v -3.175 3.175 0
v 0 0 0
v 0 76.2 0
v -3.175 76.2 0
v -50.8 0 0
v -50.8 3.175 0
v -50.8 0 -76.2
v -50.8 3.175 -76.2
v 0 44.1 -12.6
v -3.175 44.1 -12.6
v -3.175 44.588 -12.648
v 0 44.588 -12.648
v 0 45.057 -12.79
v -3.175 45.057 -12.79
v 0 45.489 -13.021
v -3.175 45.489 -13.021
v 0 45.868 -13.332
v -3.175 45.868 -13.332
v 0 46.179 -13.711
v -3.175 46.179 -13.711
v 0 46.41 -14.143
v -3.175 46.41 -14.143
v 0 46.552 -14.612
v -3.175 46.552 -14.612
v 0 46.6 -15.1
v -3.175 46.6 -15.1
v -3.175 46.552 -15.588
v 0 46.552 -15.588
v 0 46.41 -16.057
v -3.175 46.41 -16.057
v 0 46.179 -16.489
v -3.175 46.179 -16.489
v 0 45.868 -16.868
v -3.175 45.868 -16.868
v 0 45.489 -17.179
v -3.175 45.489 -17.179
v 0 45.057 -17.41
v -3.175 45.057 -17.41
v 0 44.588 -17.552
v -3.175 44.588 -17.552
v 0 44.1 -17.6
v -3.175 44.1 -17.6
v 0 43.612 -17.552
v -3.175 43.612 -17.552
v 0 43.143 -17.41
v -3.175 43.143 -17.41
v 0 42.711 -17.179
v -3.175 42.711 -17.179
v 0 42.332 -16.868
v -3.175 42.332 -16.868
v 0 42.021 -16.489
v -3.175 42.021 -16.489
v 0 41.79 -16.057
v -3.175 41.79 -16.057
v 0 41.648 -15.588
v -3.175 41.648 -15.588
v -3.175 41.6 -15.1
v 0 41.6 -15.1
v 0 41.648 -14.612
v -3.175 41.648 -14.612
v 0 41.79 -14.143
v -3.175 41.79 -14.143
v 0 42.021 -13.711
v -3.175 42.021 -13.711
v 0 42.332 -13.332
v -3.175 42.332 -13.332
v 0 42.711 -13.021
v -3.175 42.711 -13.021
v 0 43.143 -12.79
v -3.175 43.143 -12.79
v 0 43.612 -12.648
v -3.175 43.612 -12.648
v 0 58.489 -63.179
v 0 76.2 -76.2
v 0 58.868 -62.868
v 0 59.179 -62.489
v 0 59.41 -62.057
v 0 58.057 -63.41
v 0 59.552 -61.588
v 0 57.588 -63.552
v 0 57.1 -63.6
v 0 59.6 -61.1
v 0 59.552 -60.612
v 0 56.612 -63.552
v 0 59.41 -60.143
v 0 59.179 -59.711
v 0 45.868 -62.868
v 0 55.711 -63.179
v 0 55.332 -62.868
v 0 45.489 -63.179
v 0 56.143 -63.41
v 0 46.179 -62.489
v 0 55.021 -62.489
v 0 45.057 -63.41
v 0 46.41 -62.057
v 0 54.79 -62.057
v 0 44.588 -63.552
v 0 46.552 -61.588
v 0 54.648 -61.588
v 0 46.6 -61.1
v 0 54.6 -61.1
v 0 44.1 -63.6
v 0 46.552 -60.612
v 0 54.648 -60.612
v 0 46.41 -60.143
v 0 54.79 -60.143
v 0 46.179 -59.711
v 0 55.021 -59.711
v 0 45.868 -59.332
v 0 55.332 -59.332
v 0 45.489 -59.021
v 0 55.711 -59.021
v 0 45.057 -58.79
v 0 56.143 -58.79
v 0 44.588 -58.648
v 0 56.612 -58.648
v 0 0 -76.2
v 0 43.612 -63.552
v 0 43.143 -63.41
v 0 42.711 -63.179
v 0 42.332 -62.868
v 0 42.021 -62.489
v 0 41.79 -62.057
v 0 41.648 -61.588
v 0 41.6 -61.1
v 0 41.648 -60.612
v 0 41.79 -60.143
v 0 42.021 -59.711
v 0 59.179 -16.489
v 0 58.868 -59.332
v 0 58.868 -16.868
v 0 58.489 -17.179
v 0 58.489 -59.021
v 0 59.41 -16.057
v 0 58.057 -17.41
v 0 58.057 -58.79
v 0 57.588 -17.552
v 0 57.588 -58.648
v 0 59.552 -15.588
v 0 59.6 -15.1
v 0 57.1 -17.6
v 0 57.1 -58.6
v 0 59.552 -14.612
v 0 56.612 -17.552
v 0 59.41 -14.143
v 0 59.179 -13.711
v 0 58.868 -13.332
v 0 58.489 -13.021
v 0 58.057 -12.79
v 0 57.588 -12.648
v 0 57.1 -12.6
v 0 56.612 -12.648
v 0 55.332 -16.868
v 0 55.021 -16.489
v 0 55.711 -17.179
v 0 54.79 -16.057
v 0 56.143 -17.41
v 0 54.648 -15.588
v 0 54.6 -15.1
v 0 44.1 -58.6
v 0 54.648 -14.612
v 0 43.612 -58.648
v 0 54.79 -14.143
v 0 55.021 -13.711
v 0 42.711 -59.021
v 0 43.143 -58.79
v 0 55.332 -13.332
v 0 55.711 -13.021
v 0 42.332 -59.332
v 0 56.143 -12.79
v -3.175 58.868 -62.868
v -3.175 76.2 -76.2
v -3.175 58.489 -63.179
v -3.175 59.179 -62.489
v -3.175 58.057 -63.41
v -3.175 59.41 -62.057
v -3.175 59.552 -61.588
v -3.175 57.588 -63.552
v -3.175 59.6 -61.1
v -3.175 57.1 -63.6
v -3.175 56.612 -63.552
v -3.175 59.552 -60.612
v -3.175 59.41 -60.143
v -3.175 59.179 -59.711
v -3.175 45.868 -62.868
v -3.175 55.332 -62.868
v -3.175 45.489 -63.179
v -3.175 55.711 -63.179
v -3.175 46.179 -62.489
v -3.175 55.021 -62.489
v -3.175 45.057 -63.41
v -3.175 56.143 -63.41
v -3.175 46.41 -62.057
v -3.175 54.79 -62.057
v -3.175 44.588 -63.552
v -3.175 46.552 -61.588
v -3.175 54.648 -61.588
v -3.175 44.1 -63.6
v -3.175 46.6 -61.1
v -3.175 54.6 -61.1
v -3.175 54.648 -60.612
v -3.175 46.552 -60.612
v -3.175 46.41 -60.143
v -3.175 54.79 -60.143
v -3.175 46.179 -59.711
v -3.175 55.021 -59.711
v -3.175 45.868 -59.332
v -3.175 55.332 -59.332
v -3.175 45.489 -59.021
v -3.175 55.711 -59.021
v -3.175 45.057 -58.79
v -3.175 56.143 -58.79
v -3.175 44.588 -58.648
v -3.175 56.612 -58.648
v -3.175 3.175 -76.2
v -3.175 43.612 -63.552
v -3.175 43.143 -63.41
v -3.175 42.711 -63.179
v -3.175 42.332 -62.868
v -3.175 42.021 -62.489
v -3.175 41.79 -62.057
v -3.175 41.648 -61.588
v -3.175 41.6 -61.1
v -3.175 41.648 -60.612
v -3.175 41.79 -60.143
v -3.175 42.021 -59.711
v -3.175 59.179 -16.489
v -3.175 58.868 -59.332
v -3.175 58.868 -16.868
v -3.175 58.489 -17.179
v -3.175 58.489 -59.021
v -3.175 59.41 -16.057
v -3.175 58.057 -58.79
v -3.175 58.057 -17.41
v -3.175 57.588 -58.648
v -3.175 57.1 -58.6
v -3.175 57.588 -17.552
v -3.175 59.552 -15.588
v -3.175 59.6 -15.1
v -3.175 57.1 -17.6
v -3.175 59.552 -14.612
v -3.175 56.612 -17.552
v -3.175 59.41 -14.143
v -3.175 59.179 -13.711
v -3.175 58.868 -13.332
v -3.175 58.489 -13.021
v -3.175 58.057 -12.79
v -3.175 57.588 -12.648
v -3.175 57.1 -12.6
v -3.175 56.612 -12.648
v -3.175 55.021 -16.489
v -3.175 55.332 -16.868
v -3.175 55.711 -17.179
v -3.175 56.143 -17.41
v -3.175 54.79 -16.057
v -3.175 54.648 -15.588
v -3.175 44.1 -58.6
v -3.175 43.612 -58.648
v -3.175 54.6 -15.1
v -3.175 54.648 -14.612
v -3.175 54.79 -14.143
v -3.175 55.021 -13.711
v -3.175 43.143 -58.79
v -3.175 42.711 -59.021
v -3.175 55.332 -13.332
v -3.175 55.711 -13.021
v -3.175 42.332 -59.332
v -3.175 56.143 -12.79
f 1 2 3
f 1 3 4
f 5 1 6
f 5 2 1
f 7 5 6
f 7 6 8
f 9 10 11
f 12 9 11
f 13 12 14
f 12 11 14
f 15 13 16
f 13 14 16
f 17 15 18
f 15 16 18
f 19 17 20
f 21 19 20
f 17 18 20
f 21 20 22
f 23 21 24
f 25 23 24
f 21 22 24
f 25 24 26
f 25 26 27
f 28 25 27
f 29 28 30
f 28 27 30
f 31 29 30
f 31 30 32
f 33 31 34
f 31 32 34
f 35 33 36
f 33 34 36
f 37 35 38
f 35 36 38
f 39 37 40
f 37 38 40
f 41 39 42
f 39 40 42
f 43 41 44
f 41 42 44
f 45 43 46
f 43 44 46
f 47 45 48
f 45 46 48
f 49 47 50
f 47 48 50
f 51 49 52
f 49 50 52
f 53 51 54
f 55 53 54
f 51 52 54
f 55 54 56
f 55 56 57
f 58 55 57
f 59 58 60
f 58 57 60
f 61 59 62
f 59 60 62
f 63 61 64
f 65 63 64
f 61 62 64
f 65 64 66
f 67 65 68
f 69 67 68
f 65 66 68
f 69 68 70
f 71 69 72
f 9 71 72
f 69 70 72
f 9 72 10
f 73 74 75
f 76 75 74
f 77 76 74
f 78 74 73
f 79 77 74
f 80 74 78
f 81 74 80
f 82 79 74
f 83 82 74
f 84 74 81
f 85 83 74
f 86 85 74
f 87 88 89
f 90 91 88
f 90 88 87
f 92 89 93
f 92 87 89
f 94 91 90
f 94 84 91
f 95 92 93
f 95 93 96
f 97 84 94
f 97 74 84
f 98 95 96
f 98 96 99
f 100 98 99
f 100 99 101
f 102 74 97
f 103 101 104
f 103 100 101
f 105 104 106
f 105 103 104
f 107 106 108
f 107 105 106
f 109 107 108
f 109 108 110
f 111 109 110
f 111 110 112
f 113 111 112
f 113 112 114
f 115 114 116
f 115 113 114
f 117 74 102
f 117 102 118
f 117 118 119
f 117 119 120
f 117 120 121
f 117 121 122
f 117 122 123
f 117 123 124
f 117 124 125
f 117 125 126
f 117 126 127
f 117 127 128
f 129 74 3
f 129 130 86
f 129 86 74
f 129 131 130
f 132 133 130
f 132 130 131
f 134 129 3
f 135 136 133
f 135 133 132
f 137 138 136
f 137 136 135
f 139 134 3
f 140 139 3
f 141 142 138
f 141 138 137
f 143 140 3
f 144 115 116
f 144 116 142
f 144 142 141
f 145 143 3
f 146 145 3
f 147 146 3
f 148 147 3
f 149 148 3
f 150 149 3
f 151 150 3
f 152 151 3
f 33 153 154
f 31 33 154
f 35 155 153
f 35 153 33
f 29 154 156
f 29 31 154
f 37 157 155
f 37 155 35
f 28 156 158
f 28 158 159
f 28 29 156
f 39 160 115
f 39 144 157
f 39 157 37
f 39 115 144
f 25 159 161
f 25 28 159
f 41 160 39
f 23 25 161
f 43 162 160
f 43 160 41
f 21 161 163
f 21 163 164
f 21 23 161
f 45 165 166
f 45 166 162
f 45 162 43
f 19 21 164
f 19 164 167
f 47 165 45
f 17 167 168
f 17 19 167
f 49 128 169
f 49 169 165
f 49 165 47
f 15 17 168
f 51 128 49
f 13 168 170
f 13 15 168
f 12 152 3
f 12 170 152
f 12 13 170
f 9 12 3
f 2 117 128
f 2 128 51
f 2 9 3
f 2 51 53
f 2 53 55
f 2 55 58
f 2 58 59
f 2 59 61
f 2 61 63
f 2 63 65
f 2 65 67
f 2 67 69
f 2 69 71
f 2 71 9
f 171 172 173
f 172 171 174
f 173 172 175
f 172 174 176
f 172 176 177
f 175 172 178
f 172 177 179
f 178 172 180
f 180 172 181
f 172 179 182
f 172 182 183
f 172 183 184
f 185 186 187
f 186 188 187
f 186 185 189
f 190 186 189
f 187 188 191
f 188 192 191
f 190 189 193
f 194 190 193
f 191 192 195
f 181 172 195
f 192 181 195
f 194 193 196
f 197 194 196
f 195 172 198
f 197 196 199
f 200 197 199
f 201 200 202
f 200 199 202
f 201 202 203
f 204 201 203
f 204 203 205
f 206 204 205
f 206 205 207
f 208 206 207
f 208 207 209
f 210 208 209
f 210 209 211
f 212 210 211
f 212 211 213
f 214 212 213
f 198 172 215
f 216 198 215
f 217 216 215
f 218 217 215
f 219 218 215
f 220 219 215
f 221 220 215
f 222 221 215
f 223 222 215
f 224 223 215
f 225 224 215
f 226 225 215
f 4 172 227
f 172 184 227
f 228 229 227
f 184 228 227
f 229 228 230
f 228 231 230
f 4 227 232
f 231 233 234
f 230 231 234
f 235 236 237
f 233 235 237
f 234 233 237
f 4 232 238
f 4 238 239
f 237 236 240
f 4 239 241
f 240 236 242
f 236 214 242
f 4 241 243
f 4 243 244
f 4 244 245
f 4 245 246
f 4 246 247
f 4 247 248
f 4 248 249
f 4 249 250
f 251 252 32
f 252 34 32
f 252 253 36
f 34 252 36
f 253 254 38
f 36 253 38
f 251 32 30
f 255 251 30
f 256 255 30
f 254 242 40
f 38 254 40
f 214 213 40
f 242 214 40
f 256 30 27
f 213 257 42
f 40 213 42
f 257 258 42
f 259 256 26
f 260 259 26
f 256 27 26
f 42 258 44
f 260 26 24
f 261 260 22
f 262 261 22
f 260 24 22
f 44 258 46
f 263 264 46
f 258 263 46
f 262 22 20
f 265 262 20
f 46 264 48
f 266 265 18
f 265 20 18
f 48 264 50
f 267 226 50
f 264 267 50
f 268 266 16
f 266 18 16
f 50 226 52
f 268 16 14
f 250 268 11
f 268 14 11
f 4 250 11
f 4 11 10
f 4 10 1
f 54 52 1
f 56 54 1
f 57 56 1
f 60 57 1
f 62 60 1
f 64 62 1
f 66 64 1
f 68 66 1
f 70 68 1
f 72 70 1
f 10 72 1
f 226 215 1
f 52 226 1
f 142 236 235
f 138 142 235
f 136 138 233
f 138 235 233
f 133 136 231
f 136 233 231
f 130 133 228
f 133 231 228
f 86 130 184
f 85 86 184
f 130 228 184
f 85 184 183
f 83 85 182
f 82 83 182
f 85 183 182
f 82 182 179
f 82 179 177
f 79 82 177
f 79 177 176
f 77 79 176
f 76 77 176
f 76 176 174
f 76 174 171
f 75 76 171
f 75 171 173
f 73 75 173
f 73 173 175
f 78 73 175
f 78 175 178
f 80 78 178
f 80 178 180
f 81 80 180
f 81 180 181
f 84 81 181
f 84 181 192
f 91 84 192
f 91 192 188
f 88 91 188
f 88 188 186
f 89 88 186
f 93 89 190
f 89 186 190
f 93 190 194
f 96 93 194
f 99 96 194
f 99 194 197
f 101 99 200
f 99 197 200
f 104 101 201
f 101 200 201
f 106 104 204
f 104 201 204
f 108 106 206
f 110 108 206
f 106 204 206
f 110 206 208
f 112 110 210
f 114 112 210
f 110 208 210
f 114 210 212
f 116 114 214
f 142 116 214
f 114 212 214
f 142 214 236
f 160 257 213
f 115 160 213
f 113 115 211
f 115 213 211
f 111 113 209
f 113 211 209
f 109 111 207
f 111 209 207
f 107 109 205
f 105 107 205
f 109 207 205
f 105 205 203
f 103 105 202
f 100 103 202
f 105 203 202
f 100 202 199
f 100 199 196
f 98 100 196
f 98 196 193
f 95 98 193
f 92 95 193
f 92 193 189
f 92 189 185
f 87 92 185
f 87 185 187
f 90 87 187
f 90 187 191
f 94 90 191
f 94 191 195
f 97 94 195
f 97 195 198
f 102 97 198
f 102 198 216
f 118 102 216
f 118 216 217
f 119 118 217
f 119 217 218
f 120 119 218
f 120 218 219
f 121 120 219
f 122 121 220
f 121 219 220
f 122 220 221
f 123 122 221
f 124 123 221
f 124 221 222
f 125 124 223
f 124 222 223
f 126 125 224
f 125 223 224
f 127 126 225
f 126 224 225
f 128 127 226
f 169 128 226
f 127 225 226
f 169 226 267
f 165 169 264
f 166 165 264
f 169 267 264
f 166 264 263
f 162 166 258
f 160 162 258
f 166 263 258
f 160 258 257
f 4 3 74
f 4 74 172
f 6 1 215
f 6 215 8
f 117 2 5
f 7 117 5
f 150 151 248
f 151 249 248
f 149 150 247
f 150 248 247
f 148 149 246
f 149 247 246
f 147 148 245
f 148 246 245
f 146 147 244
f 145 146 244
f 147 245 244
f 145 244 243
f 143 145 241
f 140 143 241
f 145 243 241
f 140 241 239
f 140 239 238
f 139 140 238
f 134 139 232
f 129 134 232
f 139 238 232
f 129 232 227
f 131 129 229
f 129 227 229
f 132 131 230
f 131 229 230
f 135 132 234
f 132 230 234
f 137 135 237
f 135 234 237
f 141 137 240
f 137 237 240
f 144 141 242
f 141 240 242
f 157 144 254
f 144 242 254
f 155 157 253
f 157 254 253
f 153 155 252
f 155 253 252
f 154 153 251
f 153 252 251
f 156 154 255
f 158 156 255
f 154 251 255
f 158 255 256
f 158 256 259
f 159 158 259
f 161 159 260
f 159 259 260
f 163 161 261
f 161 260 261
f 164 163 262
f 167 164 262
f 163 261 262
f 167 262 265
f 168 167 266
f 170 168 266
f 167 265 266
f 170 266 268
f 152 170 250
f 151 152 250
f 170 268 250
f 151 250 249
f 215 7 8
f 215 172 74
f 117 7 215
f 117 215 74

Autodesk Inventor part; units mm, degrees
ref_plane "YZ Plane" through (0, 0, 0) normal (1, 0, 0) x (0, 1, 0)
ref_plane "XZ Plane" through (0, 0, 0) normal (0, 1, 0) x (-1, 0, 0)
ref_plane "XY Plane" through (0, 0, 0) normal (0, 0, 1) x (1, 0, 0)
sketch "Sketch1" plane through (0, 0, 0) normal (0, 1, 0) x (-1, 0, 0)
  line L0 (0, 0) -> (50.8, 0)
  line L1 (50.8, 0) -> (50.8, -76.2)
  line L2 (50.8, -76.2) -> (0, -76.2)
  line L3 (0, -76.2) -> (0, 0)
  dimension "d0" = 50.8
  dimension "d1" = 76.2
extrude "Extrusion1" add sketch "Sketch1" along normal blind 76.2
shell "Shell1" thickness 3.175 removed faces 4 at (-33.8667, 25.4, 0) at (-50.8, 25.4, -50.8) at (-16.9333, 25.4, -76.2) at (-33.8667, 76.2, -50.8)
sketch "Sketch2" plane through (-3.175, 3.175, 0) normal (-1, 0, 0) x (0, 0, 1)
  circle A0 centre (-15.1, 40.925) radius 2.5
  circle A1 centre (-61.1, 53.925) radius 2.5
  circle A2 centre (-61.1, 40.925) radius 2.5
  circle A3 centre (-15.1, 53.925) radius 2.5
  line L0 (-61.1, 53.925) -> (-15.1, 53.925) construction
  line L1 (-15.1, 53.925) -> (-15.1, 40.925) construction
  line L2 (-15.1, 40.925) -> (-61.1, 40.925) construction
  line L3 (-61.1, 40.925) -> (-61.1, 53.925) construction
  line L4 (0, 0) -> (-76.2, 0) projected
  point P0 (0, -3.175)
  point P1 (-38.1, 53.925)
  point P2 (-38.1, 0)
  dimension "d5" = 5
  dimension "d6" = 46
  dimension "d7" = 13
  dimension "d8" = 40.925
extrude "Extrusion2" cut sketch "Sketch2" against normal blind 25.4
properties part number "BK10_Z_Mount"
